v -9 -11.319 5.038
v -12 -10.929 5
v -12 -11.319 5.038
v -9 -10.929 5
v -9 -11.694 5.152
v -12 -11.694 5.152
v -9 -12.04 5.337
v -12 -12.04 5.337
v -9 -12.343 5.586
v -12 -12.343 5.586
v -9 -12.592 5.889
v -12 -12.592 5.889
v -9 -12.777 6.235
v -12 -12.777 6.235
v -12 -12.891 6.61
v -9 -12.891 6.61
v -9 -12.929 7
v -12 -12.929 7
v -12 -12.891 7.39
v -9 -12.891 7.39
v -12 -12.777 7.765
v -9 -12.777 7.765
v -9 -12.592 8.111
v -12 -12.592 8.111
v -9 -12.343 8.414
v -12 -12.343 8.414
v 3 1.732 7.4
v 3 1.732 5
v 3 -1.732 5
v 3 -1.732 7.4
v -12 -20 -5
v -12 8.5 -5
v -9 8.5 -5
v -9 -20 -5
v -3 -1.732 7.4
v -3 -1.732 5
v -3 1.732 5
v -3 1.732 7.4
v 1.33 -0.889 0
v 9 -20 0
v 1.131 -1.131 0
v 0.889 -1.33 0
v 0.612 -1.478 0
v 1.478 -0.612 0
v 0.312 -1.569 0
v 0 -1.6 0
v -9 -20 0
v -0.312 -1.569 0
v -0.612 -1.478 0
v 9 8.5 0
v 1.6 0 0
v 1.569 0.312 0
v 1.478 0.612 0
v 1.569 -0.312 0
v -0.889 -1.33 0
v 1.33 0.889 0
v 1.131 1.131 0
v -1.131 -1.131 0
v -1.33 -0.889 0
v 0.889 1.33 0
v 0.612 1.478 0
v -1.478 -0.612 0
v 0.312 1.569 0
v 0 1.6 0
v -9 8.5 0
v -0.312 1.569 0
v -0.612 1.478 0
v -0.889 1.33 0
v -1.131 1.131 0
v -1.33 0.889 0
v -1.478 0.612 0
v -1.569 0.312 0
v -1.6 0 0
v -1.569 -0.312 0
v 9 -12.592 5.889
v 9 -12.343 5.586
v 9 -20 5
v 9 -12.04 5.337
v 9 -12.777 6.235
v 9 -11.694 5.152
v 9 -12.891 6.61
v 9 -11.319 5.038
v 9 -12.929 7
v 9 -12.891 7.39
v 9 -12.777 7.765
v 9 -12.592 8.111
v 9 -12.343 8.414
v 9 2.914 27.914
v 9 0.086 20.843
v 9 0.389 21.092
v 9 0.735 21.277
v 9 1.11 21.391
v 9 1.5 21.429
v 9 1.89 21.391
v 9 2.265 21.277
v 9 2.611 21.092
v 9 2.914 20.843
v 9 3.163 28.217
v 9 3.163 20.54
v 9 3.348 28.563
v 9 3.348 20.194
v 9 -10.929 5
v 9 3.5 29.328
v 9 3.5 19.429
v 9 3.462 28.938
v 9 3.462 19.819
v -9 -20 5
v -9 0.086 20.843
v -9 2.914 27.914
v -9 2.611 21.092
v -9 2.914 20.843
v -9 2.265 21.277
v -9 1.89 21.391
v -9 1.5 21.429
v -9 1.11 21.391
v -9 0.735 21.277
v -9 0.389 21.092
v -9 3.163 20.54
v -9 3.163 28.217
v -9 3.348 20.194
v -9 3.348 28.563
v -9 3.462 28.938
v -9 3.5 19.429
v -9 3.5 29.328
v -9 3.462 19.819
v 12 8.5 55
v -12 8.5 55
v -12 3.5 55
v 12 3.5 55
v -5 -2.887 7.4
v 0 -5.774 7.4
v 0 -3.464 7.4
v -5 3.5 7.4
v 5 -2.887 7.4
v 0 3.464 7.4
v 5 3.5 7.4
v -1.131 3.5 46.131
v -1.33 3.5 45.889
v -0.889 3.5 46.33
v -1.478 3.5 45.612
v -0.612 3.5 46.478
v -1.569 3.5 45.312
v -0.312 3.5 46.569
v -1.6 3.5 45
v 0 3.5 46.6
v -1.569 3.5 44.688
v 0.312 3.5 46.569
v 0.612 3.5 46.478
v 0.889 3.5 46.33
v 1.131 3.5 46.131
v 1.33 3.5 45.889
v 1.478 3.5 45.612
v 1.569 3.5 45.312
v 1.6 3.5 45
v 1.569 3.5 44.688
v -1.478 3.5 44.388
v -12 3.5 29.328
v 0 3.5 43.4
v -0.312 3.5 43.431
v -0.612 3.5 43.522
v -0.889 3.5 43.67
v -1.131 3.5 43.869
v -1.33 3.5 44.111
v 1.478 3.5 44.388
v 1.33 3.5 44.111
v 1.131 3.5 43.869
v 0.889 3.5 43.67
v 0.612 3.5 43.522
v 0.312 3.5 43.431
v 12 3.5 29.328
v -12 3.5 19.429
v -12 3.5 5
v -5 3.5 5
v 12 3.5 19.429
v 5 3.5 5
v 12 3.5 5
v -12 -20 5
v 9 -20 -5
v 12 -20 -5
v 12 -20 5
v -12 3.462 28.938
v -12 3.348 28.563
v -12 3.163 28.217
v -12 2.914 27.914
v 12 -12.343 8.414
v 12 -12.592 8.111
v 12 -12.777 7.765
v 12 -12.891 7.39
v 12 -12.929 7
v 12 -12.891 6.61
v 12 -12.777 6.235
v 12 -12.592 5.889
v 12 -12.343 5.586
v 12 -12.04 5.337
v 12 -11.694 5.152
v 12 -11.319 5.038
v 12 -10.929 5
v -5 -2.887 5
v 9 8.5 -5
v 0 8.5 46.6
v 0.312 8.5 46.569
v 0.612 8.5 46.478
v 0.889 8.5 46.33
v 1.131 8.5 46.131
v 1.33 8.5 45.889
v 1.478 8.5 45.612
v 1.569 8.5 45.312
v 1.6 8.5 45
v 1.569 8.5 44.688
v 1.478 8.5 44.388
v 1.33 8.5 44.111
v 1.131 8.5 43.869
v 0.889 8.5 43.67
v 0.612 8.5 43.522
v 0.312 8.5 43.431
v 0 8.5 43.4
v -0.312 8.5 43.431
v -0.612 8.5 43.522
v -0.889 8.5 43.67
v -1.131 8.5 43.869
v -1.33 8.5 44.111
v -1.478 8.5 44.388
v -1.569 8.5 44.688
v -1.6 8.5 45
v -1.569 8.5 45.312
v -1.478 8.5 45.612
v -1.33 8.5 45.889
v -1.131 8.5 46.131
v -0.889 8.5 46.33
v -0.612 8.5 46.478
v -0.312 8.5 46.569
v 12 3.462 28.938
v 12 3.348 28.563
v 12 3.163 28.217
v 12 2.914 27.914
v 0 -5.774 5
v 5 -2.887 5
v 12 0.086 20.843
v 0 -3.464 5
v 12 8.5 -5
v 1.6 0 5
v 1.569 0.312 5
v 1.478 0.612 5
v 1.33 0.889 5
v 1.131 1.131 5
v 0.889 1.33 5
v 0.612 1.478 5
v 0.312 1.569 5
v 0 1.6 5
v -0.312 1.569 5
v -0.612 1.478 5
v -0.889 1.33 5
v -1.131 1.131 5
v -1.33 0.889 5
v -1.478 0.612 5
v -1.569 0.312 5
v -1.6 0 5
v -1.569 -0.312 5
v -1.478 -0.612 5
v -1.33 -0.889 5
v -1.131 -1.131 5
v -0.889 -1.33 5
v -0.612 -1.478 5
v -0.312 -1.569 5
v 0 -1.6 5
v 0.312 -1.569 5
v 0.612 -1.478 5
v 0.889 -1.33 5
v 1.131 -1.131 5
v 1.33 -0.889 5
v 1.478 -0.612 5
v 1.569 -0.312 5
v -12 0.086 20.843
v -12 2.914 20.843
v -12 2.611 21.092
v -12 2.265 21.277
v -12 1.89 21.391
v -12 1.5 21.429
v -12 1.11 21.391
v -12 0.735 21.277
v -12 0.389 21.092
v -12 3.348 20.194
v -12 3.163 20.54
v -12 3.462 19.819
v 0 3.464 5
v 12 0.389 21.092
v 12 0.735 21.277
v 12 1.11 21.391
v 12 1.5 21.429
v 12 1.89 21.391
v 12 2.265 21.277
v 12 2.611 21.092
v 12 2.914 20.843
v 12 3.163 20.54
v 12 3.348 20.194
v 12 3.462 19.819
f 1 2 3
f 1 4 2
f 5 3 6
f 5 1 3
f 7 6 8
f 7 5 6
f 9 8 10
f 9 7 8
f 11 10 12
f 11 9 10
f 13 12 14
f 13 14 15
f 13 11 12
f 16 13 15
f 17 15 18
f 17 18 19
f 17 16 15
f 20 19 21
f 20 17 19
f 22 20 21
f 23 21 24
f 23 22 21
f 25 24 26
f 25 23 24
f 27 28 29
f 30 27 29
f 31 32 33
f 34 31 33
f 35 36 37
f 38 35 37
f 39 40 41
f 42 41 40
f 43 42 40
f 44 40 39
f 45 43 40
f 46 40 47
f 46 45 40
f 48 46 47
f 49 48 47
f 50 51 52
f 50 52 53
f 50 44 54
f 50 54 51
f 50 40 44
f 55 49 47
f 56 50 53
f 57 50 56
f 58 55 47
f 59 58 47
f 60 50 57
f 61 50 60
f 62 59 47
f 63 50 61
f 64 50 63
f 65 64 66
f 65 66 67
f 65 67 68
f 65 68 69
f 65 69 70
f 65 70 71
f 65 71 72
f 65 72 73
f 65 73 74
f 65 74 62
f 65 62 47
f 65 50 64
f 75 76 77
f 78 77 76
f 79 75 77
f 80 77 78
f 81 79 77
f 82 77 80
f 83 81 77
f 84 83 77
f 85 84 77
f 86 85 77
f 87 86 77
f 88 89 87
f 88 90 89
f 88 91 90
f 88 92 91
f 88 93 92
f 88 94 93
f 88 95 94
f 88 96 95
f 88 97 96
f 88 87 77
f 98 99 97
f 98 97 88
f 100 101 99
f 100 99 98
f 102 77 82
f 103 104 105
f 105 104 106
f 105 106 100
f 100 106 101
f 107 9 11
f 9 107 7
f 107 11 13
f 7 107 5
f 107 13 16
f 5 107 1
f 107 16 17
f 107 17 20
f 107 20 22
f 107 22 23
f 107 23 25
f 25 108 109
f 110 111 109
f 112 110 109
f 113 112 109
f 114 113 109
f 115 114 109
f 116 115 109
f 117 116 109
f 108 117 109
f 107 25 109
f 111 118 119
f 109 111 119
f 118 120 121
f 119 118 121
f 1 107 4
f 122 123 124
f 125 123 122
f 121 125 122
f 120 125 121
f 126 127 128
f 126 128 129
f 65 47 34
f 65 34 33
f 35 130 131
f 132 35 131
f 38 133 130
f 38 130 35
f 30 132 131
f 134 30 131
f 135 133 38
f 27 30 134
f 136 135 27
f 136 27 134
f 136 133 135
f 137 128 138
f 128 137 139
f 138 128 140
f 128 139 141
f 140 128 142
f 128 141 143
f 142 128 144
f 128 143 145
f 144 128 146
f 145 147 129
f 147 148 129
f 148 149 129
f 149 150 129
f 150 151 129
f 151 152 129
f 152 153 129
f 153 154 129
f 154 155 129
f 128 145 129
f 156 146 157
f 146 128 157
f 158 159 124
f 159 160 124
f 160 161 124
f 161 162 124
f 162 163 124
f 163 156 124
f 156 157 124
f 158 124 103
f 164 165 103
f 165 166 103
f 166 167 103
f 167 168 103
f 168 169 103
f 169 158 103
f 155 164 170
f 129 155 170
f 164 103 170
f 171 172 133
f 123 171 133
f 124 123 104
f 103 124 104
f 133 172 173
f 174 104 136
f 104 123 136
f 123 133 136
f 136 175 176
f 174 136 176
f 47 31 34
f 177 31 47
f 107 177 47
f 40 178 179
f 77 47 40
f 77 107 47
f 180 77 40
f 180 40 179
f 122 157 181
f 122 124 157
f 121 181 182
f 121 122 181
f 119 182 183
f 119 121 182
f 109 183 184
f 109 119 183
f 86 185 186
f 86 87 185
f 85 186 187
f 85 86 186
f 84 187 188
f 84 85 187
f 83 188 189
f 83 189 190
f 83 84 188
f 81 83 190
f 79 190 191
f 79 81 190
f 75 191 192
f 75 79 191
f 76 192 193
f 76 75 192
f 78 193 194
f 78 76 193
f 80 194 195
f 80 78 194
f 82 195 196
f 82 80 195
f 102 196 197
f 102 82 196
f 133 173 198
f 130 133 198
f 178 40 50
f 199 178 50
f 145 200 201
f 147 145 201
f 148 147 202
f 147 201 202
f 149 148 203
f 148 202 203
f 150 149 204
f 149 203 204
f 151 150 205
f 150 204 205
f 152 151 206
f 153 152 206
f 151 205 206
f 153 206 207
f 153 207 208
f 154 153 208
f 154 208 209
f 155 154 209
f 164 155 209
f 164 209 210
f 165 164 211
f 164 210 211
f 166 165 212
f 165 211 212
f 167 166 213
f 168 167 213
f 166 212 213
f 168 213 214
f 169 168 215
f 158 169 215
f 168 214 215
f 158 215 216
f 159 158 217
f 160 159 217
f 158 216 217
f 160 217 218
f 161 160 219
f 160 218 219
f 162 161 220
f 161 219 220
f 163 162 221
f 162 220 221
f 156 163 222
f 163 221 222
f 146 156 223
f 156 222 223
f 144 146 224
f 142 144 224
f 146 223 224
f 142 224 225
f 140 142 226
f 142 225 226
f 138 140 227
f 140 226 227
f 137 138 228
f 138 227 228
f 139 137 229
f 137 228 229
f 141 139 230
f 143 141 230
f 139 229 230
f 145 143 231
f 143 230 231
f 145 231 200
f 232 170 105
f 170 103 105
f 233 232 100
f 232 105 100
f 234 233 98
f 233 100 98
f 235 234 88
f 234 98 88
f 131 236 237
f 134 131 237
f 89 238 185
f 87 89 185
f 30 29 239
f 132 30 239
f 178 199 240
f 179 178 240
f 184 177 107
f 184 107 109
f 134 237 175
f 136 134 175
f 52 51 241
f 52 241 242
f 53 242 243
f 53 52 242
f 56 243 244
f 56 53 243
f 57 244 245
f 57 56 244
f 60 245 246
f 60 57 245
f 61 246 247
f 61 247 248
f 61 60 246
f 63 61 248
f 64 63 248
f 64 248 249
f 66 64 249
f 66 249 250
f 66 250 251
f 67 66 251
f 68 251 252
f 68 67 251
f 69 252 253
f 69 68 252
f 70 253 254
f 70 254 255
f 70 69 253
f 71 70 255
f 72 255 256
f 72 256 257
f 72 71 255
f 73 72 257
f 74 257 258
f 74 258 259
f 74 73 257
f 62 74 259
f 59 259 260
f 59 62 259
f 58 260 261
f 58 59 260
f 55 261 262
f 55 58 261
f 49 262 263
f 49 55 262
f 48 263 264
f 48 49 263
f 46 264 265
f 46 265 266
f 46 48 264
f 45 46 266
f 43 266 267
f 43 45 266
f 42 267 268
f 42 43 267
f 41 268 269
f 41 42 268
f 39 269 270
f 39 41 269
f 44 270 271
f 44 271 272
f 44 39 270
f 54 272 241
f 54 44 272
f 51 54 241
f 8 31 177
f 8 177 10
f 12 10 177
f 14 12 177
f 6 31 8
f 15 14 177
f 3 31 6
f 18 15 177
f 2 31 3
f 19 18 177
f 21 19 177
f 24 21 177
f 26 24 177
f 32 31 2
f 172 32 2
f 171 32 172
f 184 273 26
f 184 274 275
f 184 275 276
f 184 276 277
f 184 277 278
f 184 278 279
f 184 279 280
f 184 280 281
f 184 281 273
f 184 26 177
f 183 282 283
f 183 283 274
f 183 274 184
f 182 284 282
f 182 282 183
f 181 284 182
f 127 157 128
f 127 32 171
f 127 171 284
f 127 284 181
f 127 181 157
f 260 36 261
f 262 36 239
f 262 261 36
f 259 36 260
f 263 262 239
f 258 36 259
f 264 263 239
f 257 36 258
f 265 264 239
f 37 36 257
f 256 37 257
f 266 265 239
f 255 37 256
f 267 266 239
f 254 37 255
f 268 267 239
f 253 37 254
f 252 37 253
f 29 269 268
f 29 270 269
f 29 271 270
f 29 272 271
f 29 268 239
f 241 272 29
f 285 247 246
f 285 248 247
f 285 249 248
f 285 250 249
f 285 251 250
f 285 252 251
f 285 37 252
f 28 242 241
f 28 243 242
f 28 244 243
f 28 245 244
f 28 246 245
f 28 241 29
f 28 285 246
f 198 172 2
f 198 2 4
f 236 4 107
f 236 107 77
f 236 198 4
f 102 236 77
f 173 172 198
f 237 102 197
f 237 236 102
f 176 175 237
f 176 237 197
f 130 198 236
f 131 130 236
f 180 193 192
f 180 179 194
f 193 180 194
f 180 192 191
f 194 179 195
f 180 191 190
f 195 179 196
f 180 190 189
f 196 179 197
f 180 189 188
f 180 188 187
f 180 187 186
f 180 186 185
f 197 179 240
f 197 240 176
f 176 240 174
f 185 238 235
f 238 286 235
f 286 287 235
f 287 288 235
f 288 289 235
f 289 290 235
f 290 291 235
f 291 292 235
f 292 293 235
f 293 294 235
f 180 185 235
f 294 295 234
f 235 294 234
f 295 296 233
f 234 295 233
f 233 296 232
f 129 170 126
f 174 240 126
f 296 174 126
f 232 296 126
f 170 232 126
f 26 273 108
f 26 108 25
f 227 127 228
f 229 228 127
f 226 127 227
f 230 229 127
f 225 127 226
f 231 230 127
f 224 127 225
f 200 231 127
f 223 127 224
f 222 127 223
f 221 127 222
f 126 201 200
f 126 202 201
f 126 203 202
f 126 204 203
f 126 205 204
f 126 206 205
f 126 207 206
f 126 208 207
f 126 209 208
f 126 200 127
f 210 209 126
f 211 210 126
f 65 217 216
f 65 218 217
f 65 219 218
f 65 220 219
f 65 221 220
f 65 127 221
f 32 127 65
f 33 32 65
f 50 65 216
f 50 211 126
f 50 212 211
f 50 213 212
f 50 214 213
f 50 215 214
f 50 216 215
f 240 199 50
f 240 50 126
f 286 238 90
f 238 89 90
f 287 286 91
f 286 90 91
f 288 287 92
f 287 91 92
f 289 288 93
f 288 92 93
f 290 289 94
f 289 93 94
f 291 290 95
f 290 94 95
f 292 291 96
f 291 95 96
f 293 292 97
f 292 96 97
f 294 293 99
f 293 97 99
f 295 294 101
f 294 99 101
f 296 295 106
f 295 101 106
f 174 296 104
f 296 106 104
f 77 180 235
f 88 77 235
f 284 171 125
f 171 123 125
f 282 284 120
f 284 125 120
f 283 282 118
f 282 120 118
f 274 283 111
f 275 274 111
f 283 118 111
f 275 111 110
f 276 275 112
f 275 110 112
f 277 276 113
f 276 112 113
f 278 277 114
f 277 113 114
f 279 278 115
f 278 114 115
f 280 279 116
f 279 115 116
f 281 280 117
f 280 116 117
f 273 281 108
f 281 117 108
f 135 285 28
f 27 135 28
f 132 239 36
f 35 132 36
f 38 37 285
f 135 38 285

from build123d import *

# Parameters (mm, degrees)
SKETCH1_R           = 1.6
BOSS_EXTRUDE1_DEPTH = 5
SKETCH2_W           = 3
SKETCH2_H           = 28.5
BOSS_EXTRUDE2_DEPTH = 10
SKETCH3_W           = 24
SKETCH3_H           = 50
SKETCH3_R           = 1.6
BOSS_EXTRUDE3_DEPTH = 5
BOSS_EXTRUDE4_DEPTH = 3
BOSS_EXTRUDE5_START = -24
BOSS_EXTRUDE5_DEPTH = 3
BOSS_EXTRUDE6_DEPTH = 2.4
FILLET1_R           = 2


with BuildPart() as part:
    # Sketch1 → Boss-Extrude1 (new body)
    with BuildSketch(Plane.XY):
        Polygon((-9, -8.5), (-9, 8.5), (9, 8.5), (9, -8.5), (9, -20), (-9, -20), align=None)
        Circle(SKETCH1_R, mode=Mode.SUBTRACT)
    extrude(amount=BOSS_EXTRUDE1_DEPTH)

    # Sketch2 → Boss-Extrude2 (add)
    with BuildSketch(Plane.XY.offset(5)):
        with Locations((-10.5, -5.75)):
            Rectangle(SKETCH2_W, SKETCH2_H)
        with Locations((10.5, -5.75)):
            Rectangle(SKETCH2_W, SKETCH2_H)
    extrude(amount=-BOSS_EXTRUDE2_DEPTH)

    # Sketch3 → Boss-Extrude3 (add)
    with BuildSketch(Plane(origin=(0, 8.5, 0), x_dir=(1, 0, 0), z_dir=(0, 1, 0))):
        with Locations((0, -30)):
            Rectangle(SKETCH3_W, SKETCH3_H)
        with Locations(Location((0, -45, 0), (0, 0, 270))):
            Circle(SKETCH3_R, mode=Mode.SUBTRACT)
    extrude(amount=-BOSS_EXTRUDE3_DEPTH)

    # Sketch4 → Boss-Extrude4 (add)
    with BuildSketch(Plane.ZY.offset(12)):
        Polygon((28.5, 3.5), (24.257359313, 3.5), (5, -15.757359313), (5, -20), align=None)
    extrude(amount=-BOSS_EXTRUDE4_DEPTH)

    # Sketch4<3> → Boss-Extrude5 (add)
    with BuildSketch(Plane.ZY.offset(12).offset(BOSS_EXTRUDE5_START)):
        Polygon((28.5, 3.5), (24.257359313, 3.5), (5, -15.757359313), (5, -20), align=None)
    extrude(amount=BOSS_EXTRUDE5_DEPTH)

    # Sketch5 → Boss-Extrude6 (add)
    with BuildSketch(Plane.XY.offset(5)):
        Polygon((-5, 3.5), (-5, 2.886751346), (-5, -2.886751346), (0, -5.773502692), (5, -2.886751346), (5, 2.886751346), (5, 3.5), align=None)
        Polygon((3, -1.732050808), (0, -3.464101615), (-3, -1.732050808), (-3, 1.732050808), (0, 3.464101615), (3, 1.732050808), align=None, mode=Mode.SUBTRACT)
    extrude(amount=BOSS_EXTRUDE6_DEPTH)

    # Fillet1
    fillet1_edges = [part.edges().sort_by_distance(p)[0] for p in [
        (-10.5, 3.5, 24.257359313),
        (-10.5, 3.5, 28.5),
        (-10.5, -15.757359313, 5),
        (10.5, -15.757359313, 5),
        (10.5, 3.5, 28.5),
        (10.5, 3.5, 24.257359313),
    ]]
    fillet(fillet1_edges, radius=FILLET1_R)


solid = part.part
